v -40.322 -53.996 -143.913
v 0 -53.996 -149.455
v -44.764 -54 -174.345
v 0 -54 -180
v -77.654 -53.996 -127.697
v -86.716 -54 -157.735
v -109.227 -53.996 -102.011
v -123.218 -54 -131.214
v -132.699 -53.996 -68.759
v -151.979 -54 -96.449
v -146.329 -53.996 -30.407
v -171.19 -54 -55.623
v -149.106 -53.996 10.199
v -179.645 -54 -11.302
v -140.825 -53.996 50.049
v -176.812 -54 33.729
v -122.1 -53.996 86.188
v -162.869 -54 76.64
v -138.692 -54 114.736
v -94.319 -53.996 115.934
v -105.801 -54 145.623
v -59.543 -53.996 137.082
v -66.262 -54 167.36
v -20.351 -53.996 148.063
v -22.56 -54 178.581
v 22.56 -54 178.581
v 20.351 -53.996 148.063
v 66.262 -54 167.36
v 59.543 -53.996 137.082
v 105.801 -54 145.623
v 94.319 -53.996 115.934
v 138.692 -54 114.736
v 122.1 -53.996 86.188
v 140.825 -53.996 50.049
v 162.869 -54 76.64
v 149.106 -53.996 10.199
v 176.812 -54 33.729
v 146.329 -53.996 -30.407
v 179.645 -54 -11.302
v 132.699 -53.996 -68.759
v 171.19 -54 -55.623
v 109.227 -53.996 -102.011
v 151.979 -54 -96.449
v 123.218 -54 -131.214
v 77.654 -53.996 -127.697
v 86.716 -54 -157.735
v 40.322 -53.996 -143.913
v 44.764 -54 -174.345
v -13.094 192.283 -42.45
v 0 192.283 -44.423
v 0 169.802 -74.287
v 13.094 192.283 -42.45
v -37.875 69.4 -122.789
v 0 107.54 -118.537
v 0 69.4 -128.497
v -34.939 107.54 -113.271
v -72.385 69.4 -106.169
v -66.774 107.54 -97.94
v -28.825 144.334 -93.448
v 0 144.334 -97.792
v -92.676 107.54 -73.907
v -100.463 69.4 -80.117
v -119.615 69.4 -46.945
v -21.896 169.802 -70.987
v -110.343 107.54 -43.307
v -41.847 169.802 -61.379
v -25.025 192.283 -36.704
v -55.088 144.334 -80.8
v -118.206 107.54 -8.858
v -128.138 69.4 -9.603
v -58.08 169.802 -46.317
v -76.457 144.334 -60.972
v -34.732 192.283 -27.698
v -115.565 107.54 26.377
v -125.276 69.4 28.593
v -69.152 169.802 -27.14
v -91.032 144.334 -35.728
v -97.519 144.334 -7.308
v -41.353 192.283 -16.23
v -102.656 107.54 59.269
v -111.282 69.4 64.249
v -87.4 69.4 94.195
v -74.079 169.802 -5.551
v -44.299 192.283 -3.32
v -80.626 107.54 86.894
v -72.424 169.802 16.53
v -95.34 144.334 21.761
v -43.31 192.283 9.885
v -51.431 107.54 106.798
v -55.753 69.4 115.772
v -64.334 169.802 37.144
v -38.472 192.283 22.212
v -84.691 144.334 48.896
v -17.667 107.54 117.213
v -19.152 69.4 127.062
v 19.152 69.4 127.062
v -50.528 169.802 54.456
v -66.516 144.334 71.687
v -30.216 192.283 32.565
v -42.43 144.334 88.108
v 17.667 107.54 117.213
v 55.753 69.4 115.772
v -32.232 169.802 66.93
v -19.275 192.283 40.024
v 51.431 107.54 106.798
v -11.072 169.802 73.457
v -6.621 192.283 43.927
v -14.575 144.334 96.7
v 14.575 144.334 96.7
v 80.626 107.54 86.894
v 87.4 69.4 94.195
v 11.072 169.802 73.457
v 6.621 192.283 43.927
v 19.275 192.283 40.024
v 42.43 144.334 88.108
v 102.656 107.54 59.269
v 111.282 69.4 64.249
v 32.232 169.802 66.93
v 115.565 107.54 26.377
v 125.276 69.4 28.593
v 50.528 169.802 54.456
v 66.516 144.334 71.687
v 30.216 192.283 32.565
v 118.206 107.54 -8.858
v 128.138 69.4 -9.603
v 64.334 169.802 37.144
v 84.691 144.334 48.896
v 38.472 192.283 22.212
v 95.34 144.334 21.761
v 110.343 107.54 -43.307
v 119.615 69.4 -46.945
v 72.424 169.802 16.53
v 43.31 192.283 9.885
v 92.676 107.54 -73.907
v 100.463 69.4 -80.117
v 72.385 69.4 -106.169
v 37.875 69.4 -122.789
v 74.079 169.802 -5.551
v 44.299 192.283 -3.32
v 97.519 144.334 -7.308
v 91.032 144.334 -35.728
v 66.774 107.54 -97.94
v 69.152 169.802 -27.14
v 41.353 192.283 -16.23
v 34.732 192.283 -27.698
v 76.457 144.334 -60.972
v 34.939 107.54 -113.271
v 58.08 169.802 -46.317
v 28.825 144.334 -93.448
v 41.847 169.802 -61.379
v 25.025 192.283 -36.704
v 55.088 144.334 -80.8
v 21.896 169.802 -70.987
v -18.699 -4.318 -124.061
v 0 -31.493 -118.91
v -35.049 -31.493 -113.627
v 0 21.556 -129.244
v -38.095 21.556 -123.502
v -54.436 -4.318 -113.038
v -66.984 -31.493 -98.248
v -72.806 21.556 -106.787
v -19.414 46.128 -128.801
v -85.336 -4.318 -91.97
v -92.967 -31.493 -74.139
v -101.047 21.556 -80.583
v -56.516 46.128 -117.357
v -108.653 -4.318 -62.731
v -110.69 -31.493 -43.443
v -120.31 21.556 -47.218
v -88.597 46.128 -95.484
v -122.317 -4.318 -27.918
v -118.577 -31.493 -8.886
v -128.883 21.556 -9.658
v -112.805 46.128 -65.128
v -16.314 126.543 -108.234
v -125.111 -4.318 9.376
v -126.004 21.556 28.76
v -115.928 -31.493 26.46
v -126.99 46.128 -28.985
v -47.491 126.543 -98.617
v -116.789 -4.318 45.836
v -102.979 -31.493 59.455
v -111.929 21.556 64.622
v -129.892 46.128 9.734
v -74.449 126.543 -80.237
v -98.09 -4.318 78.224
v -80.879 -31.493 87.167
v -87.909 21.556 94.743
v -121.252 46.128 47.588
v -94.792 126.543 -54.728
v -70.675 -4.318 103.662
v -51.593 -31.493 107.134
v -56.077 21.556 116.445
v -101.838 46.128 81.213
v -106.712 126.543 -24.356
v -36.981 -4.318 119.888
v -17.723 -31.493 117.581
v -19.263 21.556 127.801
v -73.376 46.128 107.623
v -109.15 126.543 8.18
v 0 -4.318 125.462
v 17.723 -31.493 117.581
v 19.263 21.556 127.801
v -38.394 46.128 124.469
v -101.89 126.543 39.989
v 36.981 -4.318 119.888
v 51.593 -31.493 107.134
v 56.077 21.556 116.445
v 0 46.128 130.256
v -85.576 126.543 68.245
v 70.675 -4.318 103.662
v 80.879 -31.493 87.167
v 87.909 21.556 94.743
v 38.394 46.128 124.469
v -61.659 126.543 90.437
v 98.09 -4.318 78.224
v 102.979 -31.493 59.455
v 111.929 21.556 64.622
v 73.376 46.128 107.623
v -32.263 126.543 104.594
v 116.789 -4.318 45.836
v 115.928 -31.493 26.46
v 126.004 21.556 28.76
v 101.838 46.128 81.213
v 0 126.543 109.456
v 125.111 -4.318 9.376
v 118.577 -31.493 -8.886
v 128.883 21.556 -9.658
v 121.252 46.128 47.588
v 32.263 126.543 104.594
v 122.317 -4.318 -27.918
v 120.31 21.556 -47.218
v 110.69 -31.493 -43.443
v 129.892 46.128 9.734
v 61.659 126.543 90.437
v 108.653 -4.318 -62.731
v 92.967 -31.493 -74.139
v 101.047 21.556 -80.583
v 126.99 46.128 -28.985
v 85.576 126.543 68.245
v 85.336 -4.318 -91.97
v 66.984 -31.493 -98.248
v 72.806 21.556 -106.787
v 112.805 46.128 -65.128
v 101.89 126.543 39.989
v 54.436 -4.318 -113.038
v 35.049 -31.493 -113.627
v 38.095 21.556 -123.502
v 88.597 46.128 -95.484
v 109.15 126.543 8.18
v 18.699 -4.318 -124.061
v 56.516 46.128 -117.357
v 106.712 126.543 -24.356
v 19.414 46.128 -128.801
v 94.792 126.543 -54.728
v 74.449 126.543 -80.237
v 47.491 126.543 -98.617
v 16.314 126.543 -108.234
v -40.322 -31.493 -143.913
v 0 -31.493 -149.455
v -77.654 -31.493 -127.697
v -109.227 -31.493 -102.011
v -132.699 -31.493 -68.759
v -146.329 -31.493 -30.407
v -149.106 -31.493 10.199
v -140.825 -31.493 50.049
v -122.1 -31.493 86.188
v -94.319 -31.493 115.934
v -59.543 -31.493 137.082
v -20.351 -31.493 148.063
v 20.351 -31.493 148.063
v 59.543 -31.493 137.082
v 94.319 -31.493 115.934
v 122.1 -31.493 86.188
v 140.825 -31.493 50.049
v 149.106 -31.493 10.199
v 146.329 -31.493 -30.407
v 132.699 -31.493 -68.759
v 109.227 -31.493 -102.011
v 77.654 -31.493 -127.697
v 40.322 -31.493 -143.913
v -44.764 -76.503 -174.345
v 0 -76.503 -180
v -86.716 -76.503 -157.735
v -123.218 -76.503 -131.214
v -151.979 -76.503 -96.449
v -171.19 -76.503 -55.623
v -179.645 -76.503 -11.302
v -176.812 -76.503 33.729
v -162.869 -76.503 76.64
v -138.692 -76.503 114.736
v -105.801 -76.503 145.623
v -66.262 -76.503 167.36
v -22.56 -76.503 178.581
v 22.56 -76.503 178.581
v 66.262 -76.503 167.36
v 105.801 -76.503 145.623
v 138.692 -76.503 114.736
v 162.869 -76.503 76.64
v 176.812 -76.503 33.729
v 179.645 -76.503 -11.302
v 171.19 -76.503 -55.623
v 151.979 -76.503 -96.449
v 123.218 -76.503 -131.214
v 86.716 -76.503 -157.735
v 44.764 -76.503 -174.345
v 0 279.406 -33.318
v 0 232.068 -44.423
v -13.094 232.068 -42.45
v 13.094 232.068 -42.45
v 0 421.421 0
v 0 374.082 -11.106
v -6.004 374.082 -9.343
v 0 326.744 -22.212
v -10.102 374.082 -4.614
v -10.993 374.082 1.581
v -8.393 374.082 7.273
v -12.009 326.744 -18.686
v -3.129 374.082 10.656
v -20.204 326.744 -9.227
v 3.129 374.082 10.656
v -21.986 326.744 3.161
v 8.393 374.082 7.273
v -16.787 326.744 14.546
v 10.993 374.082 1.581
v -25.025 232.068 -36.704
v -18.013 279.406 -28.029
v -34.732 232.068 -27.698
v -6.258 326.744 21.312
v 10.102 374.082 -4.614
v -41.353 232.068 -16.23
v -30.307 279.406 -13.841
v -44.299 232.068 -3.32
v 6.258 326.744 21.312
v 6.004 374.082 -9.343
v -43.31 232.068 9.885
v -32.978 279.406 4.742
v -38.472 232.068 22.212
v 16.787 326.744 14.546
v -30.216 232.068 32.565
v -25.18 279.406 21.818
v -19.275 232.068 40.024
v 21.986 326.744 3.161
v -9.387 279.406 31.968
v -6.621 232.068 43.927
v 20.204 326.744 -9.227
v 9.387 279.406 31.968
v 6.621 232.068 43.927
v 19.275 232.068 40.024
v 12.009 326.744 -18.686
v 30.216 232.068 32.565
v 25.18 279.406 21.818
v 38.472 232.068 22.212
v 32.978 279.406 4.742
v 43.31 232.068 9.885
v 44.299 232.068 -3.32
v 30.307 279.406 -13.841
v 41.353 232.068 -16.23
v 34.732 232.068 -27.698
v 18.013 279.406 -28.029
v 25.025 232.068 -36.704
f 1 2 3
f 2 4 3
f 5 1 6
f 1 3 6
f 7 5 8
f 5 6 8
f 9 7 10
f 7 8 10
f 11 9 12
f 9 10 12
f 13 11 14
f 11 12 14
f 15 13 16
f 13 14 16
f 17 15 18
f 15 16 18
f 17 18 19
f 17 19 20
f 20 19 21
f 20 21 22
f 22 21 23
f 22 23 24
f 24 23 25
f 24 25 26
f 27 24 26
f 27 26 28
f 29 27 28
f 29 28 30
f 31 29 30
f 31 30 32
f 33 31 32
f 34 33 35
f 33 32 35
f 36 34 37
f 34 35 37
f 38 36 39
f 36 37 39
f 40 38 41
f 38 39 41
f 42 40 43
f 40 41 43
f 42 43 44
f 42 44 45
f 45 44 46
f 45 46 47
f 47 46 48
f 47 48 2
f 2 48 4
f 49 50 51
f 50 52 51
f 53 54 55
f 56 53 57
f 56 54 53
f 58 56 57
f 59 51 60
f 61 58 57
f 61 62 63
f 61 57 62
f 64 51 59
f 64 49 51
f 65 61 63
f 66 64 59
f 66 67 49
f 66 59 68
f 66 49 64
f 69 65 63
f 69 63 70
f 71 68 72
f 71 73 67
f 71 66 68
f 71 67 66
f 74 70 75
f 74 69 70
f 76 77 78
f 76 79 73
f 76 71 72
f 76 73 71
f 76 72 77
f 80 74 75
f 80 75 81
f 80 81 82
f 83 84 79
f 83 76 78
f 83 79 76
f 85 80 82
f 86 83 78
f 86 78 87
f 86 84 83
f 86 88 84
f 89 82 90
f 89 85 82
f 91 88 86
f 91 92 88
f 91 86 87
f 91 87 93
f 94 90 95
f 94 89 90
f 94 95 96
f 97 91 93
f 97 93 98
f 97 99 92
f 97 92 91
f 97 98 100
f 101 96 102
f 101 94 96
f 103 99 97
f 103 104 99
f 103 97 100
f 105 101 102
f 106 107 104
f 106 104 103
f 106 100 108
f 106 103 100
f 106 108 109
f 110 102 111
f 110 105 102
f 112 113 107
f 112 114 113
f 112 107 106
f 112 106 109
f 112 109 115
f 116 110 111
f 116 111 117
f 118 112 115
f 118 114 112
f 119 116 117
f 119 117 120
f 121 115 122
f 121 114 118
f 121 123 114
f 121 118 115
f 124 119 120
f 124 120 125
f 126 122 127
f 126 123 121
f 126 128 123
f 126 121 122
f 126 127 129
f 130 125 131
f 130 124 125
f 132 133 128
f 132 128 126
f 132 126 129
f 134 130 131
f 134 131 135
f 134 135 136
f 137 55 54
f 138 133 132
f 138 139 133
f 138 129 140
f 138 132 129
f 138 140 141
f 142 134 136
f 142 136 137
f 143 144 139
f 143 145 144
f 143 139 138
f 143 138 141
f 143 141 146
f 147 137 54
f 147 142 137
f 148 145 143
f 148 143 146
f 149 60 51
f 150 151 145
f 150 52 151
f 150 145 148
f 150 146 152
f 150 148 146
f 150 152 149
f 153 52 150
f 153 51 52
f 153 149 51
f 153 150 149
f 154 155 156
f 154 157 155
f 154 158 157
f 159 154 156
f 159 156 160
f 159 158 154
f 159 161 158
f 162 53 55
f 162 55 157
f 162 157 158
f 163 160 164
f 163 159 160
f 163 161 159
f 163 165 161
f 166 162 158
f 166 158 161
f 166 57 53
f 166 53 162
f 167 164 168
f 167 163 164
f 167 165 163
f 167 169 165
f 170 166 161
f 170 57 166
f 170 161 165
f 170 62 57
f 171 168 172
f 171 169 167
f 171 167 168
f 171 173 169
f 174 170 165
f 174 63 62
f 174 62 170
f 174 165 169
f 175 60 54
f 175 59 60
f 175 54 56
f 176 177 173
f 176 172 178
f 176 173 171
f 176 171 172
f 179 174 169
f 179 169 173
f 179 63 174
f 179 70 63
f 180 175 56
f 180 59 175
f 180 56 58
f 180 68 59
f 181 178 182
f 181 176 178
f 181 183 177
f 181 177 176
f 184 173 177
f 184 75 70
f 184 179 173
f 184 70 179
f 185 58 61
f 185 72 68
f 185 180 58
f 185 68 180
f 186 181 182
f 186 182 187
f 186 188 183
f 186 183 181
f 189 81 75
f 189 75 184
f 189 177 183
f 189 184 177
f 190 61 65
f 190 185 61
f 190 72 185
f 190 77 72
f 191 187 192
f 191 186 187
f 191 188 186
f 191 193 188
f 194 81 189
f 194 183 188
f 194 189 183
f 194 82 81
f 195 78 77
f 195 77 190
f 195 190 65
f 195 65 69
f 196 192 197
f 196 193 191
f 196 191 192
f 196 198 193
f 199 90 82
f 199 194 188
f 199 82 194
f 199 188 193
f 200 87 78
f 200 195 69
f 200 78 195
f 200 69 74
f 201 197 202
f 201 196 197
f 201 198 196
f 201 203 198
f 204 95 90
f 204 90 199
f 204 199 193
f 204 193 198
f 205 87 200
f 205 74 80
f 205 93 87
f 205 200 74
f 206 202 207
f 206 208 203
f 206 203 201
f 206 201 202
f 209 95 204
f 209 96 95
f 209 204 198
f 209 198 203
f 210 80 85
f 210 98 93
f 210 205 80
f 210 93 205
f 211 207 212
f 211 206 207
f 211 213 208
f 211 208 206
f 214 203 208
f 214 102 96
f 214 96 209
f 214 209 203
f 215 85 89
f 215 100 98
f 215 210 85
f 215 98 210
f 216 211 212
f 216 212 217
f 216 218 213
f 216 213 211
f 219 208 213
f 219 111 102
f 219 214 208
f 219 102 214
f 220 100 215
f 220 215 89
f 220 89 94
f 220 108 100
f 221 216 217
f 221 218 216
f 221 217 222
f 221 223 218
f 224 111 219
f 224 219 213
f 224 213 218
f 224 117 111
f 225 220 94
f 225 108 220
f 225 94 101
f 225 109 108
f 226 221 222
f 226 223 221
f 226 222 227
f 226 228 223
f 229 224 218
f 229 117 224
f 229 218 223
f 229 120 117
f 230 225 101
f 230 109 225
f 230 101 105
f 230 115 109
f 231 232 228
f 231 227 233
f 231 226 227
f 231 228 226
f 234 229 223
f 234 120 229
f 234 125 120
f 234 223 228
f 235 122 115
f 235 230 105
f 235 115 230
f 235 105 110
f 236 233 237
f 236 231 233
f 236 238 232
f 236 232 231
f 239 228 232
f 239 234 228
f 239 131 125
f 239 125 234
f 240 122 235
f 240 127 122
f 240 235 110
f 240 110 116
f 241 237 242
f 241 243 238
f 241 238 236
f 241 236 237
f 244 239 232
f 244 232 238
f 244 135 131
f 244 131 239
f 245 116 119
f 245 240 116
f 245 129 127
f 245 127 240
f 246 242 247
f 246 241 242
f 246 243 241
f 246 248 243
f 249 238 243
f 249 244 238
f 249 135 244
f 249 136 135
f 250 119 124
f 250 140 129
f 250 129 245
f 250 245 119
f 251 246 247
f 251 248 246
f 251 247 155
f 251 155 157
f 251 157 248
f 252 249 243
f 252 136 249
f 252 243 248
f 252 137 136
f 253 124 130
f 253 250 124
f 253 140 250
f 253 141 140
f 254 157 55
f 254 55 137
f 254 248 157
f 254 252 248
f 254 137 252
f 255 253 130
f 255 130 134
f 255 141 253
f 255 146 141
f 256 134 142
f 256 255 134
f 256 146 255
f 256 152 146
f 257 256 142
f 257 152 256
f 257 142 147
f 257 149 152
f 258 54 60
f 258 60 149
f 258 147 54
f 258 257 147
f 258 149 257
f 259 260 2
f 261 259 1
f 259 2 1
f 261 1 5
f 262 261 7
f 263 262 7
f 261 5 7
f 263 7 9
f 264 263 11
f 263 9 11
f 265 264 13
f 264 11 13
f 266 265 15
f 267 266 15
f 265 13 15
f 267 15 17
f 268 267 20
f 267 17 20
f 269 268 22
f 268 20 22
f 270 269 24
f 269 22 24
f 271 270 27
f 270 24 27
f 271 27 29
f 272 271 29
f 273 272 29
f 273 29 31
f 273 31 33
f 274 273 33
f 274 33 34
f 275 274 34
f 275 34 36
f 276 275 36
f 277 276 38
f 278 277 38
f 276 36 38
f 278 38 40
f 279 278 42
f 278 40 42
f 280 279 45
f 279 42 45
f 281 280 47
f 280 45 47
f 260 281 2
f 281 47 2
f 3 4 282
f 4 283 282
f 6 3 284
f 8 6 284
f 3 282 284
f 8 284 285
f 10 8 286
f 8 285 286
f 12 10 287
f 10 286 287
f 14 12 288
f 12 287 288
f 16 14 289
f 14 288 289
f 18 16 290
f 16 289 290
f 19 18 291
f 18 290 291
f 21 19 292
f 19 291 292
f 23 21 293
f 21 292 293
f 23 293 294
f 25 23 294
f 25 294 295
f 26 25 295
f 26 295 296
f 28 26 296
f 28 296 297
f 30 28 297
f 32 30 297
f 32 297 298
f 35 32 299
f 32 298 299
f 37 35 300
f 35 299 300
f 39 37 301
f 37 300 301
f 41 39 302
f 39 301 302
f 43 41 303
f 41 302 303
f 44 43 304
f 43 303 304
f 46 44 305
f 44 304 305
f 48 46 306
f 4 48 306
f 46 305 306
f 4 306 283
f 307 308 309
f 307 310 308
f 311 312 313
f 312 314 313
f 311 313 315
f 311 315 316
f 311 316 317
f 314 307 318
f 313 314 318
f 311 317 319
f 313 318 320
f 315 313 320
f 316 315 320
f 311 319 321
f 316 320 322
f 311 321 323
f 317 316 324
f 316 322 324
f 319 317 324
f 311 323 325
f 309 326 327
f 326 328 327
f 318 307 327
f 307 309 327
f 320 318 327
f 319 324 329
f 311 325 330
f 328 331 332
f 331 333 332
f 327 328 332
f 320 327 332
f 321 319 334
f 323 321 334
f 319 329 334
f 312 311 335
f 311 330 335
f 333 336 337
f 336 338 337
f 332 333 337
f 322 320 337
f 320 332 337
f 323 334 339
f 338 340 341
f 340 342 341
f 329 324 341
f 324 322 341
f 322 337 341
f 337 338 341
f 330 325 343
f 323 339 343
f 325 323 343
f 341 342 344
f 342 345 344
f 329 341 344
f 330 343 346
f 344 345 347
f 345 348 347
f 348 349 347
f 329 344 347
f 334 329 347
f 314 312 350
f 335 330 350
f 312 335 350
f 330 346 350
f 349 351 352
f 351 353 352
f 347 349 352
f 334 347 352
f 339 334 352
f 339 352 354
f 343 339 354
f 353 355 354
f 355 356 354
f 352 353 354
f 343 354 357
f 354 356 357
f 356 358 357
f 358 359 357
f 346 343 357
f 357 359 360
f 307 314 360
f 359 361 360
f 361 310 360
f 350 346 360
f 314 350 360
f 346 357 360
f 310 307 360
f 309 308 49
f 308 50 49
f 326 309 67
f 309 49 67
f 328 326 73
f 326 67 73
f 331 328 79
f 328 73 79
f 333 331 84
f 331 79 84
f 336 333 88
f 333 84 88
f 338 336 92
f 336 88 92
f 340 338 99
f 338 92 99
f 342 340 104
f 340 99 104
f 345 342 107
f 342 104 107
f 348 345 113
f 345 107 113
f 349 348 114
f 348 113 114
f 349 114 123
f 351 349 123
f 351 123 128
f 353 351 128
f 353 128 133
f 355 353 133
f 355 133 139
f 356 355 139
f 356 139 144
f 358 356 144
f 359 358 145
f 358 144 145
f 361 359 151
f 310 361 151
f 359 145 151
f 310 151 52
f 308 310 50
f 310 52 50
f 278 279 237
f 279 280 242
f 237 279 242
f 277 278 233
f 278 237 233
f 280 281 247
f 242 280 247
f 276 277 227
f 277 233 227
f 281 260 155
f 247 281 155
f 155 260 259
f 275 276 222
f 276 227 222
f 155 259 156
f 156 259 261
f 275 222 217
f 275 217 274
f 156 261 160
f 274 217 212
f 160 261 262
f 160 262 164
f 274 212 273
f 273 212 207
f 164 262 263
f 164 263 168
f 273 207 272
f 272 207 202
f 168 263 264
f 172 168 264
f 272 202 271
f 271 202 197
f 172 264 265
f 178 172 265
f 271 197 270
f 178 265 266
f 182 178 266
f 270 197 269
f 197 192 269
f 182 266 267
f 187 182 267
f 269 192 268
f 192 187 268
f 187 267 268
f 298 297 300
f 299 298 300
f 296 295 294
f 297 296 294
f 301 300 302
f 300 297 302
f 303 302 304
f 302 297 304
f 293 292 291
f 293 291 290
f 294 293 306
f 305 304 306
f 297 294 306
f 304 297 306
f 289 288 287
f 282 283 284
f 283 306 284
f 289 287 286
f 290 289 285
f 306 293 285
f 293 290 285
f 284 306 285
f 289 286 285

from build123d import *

# Parameters (mm, degrees)
SCALE1_SCALE = 3


with BuildPart() as part:
    # Sketch1 → Revolve1 (revolve)
    with BuildSketch(Plane.XY, mode=Mode.PRIVATE) as revolve1_sk:
        with BuildLine():
            Line((-60, 0), (0, 0))
            Line((0, 0), (0, 165.974487707))
            Line((0, 165.974487707), (-14.807816841, 102.857120804))
            Line((-14.807816841, 102.857120804), (-14.807816841, 89.595445726))
            add(Edge.make_bspline(
                [(-39.636500765, 15.003432323), (-53.842680806, 64.800607808), (-14.807816841, 89.595445726)],
                knots=[0, 0, 0, 1, 1, 1], degree=2))
            Line((-39.636500765, 15.003432323), (-49.818250415, 15.003432323))
            Line((-49.818250415, 15.003432323), (-49.818250415, 7.502288215))
            Line((-49.818250415, 7.502288215), (-60, 7.501144108))
            Line((-60, 7.501144108), (-60, 0))
        make_face()
    revolve(revolve1_sk.sketch.rotate(Axis((0, 0, 0), (0, 1, 0)), 270), axis=Axis((0, 0, 0), (0, 1, 0)))


with BuildPart() as part_1:
    # Scale1: scaled about (0, 38.251472445, 0)
    add(part.part.scale(SCALE1_SCALE).moved(Location((0, -76.50294489, 0))))


solid = part_1.part
